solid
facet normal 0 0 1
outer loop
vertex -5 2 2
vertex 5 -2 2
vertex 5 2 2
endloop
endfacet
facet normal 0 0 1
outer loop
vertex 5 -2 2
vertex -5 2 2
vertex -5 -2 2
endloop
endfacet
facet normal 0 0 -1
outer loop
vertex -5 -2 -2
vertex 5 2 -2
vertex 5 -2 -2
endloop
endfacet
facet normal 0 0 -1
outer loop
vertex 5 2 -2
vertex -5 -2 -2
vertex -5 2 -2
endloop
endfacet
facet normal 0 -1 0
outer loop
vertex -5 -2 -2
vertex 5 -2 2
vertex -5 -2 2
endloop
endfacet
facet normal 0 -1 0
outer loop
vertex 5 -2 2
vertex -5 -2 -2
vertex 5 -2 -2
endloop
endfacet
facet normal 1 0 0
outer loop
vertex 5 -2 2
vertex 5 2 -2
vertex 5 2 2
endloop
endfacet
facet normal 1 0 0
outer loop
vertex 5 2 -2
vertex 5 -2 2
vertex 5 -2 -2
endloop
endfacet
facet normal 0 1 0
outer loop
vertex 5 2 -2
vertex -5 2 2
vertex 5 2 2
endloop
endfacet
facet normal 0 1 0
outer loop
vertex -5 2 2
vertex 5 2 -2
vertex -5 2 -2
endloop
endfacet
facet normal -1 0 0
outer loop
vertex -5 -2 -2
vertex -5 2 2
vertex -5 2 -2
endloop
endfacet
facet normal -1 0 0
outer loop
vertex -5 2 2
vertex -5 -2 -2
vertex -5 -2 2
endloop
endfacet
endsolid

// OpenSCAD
// Simple moving model for the animation container export test.
rotate([0, 0, 360 * $t]) cube([10, 4, 4], center = true);
